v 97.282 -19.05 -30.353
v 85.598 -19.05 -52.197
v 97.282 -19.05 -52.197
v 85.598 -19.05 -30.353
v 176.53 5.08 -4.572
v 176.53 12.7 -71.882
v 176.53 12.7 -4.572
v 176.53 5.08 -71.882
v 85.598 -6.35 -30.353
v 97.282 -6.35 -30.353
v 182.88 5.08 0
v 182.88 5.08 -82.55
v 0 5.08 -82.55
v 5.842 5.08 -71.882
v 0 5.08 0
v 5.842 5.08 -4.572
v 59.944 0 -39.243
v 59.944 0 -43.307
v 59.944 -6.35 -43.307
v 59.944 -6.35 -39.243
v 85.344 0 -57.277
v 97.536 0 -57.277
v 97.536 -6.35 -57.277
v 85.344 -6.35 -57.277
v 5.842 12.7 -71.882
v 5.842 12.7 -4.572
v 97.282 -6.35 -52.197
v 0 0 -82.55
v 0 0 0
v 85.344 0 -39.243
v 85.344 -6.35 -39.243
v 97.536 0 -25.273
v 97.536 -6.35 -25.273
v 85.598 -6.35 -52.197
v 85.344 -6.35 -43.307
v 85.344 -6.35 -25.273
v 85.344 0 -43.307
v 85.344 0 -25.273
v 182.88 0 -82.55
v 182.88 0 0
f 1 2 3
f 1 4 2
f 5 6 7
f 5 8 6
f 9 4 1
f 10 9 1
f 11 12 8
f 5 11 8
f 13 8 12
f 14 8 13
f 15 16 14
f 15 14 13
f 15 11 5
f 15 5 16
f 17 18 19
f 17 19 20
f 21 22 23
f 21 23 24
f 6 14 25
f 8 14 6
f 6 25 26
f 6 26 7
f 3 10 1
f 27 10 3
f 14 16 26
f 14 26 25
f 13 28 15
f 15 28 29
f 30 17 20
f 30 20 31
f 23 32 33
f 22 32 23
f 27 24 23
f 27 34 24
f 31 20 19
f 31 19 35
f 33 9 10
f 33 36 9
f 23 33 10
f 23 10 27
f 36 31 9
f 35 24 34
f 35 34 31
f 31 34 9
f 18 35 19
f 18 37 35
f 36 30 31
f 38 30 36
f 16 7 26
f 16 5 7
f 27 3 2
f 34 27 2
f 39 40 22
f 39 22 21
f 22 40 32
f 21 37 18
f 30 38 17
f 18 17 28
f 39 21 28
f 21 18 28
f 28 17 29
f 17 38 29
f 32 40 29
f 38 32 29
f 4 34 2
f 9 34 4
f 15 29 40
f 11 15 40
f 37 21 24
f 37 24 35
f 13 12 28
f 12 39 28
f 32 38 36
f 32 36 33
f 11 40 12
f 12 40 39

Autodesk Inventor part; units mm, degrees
ref_plane "YZ Plane" through (0, 0, 0) normal (1, 0, 0) x (0, 1, 0)
ref_plane "XZ Plane" through (0, 0, 0) normal (0, 1, 0) x (-1, 0, 0)
ref_plane "XY Plane" through (0, 0, 0) normal (0, 0, 1) x (1, 0, 0)
sketch "Sketch1" plane through (0, 0, 0) normal (0, 1, 0) x (-1, 0, 0)
  line L0 (0, 0) -> (-182.88, 0)
  line L1 (-182.88, 0) -> (-182.88, -82.55)
  line L2 (-182.88, -82.55) -> (0, -82.55)
  line L3 (0, -82.55) -> (0, 0)
  dimension "d0" = 82.55
  dimension "d1" = 182.88
extrude "Extrusion1" add sketch "Sketch1" along normal blind 5.08
sketch "Sketch2" plane through (0, 5.08, 0) normal (0, 1, 0) x (1, 0, 0)
  line L0 (5.842, 71.882) -> (176.53, 71.882)
  line L1 (176.53, 71.882) -> (176.53, 4.572)
  line L2 (176.53, 4.572) -> (5.842, 4.572)
  line L3 (5.842, 4.572) -> (5.842, 71.882)
  line L4 (0, 82.55) -> (0, 0) projected
  line L5 (182.88, 0) -> (182.88, 82.55) projected
  line L6 (0, 0) -> (182.88, 0) projected
  line L7 (182.88, 82.55) -> (0, 82.55) projected
  line L8 (172.232, 67.584) -> (10.14, 67.584)
  line L9 (10.14, 67.584) -> (10.14, 8.87)
  line L10 (10.14, 8.87) -> (172.232, 8.87)
  line L11 (172.232, 8.87) -> (172.232, 67.584)
  point P0 (182.88, 41.275)
  dimension "d4" = 5.842
  dimension "d5" = 6.35
  dimension "d6" = 4.572
  dimension "d7" = 10.668
extrude "Extrusion2" add sketch "Sketch2" along normal blind 7.62 contours L0 L1 L2 L3 | L11 L10 L9 L8
sketch "Sketch3" plane through (0, 0, 0) normal (0, -1, 0) x (1, 0, 0)
  line L0 (97.536, -57.277) -> (85.344, -57.277)
  line L1 (85.344, -57.277) -> (85.344, -25.273)
  line L2 (85.344, -25.273) -> (97.536, -25.273)
  line L3 (97.536, -25.273) -> (97.536, -57.277)
  line L4 (182.88, 0) -> (182.88, -82.55) projected
  line L5 (0, 0) -> (182.88, 0) projected
  line L6 (85.344, -43.307) -> (59.944, -43.307)
  line L7 (59.944, -43.307) -> (59.944, -39.243)
  line L8 (59.944, -39.243) -> (85.344, -39.243)
  line L9 (85.344, -39.243) -> (85.344, -43.307)
  point P0 (97.536, -41.275)
  point P1 (182.88, -41.275)
  point P2 (91.44, -25.273)
  point P3 (91.44, 0)
  point P4 (59.944, -41.275)
  point P5 (85.344, -41.275)
  dimension "d10" = 32.004
  dimension "d11" = 12.192
  dimension "d12" = 25.4
  dimension "d13" = 4.064
extrude "Extrusion3" add sketch "Sketch3" along normal blind 6.35
sketch "Sketch4" plane through (0, -6.35, 0) normal (0, -1, 0) x (1, 0, 0)
  line L0 (97.282, -52.197) -> (85.598, -52.197)
  line L1 (85.598, -52.197) -> (85.598, -30.353)
  line L2 (85.598, -30.353) -> (97.282, -30.353)
  line L3 (97.282, -30.353) -> (97.282, -52.197)
  line L4 (97.536, -57.277) -> (97.536, -25.273) projected
  line L5 (85.344, -57.277) -> (97.536, -57.277) projected
  point P0 (0, 0)
  point P1 (85.598, -41.275)
  point P2 (97.536, -41.275)
  point P3 (91.44, -52.197)
  point P4 (91.44, -57.277)
  dimension "d16" = 21.844
  dimension "d17" = 11.684
extrude "Extrusion4" add sketch "Sketch4" along normal blind 12.7
properties part number "Base Box Lid"
